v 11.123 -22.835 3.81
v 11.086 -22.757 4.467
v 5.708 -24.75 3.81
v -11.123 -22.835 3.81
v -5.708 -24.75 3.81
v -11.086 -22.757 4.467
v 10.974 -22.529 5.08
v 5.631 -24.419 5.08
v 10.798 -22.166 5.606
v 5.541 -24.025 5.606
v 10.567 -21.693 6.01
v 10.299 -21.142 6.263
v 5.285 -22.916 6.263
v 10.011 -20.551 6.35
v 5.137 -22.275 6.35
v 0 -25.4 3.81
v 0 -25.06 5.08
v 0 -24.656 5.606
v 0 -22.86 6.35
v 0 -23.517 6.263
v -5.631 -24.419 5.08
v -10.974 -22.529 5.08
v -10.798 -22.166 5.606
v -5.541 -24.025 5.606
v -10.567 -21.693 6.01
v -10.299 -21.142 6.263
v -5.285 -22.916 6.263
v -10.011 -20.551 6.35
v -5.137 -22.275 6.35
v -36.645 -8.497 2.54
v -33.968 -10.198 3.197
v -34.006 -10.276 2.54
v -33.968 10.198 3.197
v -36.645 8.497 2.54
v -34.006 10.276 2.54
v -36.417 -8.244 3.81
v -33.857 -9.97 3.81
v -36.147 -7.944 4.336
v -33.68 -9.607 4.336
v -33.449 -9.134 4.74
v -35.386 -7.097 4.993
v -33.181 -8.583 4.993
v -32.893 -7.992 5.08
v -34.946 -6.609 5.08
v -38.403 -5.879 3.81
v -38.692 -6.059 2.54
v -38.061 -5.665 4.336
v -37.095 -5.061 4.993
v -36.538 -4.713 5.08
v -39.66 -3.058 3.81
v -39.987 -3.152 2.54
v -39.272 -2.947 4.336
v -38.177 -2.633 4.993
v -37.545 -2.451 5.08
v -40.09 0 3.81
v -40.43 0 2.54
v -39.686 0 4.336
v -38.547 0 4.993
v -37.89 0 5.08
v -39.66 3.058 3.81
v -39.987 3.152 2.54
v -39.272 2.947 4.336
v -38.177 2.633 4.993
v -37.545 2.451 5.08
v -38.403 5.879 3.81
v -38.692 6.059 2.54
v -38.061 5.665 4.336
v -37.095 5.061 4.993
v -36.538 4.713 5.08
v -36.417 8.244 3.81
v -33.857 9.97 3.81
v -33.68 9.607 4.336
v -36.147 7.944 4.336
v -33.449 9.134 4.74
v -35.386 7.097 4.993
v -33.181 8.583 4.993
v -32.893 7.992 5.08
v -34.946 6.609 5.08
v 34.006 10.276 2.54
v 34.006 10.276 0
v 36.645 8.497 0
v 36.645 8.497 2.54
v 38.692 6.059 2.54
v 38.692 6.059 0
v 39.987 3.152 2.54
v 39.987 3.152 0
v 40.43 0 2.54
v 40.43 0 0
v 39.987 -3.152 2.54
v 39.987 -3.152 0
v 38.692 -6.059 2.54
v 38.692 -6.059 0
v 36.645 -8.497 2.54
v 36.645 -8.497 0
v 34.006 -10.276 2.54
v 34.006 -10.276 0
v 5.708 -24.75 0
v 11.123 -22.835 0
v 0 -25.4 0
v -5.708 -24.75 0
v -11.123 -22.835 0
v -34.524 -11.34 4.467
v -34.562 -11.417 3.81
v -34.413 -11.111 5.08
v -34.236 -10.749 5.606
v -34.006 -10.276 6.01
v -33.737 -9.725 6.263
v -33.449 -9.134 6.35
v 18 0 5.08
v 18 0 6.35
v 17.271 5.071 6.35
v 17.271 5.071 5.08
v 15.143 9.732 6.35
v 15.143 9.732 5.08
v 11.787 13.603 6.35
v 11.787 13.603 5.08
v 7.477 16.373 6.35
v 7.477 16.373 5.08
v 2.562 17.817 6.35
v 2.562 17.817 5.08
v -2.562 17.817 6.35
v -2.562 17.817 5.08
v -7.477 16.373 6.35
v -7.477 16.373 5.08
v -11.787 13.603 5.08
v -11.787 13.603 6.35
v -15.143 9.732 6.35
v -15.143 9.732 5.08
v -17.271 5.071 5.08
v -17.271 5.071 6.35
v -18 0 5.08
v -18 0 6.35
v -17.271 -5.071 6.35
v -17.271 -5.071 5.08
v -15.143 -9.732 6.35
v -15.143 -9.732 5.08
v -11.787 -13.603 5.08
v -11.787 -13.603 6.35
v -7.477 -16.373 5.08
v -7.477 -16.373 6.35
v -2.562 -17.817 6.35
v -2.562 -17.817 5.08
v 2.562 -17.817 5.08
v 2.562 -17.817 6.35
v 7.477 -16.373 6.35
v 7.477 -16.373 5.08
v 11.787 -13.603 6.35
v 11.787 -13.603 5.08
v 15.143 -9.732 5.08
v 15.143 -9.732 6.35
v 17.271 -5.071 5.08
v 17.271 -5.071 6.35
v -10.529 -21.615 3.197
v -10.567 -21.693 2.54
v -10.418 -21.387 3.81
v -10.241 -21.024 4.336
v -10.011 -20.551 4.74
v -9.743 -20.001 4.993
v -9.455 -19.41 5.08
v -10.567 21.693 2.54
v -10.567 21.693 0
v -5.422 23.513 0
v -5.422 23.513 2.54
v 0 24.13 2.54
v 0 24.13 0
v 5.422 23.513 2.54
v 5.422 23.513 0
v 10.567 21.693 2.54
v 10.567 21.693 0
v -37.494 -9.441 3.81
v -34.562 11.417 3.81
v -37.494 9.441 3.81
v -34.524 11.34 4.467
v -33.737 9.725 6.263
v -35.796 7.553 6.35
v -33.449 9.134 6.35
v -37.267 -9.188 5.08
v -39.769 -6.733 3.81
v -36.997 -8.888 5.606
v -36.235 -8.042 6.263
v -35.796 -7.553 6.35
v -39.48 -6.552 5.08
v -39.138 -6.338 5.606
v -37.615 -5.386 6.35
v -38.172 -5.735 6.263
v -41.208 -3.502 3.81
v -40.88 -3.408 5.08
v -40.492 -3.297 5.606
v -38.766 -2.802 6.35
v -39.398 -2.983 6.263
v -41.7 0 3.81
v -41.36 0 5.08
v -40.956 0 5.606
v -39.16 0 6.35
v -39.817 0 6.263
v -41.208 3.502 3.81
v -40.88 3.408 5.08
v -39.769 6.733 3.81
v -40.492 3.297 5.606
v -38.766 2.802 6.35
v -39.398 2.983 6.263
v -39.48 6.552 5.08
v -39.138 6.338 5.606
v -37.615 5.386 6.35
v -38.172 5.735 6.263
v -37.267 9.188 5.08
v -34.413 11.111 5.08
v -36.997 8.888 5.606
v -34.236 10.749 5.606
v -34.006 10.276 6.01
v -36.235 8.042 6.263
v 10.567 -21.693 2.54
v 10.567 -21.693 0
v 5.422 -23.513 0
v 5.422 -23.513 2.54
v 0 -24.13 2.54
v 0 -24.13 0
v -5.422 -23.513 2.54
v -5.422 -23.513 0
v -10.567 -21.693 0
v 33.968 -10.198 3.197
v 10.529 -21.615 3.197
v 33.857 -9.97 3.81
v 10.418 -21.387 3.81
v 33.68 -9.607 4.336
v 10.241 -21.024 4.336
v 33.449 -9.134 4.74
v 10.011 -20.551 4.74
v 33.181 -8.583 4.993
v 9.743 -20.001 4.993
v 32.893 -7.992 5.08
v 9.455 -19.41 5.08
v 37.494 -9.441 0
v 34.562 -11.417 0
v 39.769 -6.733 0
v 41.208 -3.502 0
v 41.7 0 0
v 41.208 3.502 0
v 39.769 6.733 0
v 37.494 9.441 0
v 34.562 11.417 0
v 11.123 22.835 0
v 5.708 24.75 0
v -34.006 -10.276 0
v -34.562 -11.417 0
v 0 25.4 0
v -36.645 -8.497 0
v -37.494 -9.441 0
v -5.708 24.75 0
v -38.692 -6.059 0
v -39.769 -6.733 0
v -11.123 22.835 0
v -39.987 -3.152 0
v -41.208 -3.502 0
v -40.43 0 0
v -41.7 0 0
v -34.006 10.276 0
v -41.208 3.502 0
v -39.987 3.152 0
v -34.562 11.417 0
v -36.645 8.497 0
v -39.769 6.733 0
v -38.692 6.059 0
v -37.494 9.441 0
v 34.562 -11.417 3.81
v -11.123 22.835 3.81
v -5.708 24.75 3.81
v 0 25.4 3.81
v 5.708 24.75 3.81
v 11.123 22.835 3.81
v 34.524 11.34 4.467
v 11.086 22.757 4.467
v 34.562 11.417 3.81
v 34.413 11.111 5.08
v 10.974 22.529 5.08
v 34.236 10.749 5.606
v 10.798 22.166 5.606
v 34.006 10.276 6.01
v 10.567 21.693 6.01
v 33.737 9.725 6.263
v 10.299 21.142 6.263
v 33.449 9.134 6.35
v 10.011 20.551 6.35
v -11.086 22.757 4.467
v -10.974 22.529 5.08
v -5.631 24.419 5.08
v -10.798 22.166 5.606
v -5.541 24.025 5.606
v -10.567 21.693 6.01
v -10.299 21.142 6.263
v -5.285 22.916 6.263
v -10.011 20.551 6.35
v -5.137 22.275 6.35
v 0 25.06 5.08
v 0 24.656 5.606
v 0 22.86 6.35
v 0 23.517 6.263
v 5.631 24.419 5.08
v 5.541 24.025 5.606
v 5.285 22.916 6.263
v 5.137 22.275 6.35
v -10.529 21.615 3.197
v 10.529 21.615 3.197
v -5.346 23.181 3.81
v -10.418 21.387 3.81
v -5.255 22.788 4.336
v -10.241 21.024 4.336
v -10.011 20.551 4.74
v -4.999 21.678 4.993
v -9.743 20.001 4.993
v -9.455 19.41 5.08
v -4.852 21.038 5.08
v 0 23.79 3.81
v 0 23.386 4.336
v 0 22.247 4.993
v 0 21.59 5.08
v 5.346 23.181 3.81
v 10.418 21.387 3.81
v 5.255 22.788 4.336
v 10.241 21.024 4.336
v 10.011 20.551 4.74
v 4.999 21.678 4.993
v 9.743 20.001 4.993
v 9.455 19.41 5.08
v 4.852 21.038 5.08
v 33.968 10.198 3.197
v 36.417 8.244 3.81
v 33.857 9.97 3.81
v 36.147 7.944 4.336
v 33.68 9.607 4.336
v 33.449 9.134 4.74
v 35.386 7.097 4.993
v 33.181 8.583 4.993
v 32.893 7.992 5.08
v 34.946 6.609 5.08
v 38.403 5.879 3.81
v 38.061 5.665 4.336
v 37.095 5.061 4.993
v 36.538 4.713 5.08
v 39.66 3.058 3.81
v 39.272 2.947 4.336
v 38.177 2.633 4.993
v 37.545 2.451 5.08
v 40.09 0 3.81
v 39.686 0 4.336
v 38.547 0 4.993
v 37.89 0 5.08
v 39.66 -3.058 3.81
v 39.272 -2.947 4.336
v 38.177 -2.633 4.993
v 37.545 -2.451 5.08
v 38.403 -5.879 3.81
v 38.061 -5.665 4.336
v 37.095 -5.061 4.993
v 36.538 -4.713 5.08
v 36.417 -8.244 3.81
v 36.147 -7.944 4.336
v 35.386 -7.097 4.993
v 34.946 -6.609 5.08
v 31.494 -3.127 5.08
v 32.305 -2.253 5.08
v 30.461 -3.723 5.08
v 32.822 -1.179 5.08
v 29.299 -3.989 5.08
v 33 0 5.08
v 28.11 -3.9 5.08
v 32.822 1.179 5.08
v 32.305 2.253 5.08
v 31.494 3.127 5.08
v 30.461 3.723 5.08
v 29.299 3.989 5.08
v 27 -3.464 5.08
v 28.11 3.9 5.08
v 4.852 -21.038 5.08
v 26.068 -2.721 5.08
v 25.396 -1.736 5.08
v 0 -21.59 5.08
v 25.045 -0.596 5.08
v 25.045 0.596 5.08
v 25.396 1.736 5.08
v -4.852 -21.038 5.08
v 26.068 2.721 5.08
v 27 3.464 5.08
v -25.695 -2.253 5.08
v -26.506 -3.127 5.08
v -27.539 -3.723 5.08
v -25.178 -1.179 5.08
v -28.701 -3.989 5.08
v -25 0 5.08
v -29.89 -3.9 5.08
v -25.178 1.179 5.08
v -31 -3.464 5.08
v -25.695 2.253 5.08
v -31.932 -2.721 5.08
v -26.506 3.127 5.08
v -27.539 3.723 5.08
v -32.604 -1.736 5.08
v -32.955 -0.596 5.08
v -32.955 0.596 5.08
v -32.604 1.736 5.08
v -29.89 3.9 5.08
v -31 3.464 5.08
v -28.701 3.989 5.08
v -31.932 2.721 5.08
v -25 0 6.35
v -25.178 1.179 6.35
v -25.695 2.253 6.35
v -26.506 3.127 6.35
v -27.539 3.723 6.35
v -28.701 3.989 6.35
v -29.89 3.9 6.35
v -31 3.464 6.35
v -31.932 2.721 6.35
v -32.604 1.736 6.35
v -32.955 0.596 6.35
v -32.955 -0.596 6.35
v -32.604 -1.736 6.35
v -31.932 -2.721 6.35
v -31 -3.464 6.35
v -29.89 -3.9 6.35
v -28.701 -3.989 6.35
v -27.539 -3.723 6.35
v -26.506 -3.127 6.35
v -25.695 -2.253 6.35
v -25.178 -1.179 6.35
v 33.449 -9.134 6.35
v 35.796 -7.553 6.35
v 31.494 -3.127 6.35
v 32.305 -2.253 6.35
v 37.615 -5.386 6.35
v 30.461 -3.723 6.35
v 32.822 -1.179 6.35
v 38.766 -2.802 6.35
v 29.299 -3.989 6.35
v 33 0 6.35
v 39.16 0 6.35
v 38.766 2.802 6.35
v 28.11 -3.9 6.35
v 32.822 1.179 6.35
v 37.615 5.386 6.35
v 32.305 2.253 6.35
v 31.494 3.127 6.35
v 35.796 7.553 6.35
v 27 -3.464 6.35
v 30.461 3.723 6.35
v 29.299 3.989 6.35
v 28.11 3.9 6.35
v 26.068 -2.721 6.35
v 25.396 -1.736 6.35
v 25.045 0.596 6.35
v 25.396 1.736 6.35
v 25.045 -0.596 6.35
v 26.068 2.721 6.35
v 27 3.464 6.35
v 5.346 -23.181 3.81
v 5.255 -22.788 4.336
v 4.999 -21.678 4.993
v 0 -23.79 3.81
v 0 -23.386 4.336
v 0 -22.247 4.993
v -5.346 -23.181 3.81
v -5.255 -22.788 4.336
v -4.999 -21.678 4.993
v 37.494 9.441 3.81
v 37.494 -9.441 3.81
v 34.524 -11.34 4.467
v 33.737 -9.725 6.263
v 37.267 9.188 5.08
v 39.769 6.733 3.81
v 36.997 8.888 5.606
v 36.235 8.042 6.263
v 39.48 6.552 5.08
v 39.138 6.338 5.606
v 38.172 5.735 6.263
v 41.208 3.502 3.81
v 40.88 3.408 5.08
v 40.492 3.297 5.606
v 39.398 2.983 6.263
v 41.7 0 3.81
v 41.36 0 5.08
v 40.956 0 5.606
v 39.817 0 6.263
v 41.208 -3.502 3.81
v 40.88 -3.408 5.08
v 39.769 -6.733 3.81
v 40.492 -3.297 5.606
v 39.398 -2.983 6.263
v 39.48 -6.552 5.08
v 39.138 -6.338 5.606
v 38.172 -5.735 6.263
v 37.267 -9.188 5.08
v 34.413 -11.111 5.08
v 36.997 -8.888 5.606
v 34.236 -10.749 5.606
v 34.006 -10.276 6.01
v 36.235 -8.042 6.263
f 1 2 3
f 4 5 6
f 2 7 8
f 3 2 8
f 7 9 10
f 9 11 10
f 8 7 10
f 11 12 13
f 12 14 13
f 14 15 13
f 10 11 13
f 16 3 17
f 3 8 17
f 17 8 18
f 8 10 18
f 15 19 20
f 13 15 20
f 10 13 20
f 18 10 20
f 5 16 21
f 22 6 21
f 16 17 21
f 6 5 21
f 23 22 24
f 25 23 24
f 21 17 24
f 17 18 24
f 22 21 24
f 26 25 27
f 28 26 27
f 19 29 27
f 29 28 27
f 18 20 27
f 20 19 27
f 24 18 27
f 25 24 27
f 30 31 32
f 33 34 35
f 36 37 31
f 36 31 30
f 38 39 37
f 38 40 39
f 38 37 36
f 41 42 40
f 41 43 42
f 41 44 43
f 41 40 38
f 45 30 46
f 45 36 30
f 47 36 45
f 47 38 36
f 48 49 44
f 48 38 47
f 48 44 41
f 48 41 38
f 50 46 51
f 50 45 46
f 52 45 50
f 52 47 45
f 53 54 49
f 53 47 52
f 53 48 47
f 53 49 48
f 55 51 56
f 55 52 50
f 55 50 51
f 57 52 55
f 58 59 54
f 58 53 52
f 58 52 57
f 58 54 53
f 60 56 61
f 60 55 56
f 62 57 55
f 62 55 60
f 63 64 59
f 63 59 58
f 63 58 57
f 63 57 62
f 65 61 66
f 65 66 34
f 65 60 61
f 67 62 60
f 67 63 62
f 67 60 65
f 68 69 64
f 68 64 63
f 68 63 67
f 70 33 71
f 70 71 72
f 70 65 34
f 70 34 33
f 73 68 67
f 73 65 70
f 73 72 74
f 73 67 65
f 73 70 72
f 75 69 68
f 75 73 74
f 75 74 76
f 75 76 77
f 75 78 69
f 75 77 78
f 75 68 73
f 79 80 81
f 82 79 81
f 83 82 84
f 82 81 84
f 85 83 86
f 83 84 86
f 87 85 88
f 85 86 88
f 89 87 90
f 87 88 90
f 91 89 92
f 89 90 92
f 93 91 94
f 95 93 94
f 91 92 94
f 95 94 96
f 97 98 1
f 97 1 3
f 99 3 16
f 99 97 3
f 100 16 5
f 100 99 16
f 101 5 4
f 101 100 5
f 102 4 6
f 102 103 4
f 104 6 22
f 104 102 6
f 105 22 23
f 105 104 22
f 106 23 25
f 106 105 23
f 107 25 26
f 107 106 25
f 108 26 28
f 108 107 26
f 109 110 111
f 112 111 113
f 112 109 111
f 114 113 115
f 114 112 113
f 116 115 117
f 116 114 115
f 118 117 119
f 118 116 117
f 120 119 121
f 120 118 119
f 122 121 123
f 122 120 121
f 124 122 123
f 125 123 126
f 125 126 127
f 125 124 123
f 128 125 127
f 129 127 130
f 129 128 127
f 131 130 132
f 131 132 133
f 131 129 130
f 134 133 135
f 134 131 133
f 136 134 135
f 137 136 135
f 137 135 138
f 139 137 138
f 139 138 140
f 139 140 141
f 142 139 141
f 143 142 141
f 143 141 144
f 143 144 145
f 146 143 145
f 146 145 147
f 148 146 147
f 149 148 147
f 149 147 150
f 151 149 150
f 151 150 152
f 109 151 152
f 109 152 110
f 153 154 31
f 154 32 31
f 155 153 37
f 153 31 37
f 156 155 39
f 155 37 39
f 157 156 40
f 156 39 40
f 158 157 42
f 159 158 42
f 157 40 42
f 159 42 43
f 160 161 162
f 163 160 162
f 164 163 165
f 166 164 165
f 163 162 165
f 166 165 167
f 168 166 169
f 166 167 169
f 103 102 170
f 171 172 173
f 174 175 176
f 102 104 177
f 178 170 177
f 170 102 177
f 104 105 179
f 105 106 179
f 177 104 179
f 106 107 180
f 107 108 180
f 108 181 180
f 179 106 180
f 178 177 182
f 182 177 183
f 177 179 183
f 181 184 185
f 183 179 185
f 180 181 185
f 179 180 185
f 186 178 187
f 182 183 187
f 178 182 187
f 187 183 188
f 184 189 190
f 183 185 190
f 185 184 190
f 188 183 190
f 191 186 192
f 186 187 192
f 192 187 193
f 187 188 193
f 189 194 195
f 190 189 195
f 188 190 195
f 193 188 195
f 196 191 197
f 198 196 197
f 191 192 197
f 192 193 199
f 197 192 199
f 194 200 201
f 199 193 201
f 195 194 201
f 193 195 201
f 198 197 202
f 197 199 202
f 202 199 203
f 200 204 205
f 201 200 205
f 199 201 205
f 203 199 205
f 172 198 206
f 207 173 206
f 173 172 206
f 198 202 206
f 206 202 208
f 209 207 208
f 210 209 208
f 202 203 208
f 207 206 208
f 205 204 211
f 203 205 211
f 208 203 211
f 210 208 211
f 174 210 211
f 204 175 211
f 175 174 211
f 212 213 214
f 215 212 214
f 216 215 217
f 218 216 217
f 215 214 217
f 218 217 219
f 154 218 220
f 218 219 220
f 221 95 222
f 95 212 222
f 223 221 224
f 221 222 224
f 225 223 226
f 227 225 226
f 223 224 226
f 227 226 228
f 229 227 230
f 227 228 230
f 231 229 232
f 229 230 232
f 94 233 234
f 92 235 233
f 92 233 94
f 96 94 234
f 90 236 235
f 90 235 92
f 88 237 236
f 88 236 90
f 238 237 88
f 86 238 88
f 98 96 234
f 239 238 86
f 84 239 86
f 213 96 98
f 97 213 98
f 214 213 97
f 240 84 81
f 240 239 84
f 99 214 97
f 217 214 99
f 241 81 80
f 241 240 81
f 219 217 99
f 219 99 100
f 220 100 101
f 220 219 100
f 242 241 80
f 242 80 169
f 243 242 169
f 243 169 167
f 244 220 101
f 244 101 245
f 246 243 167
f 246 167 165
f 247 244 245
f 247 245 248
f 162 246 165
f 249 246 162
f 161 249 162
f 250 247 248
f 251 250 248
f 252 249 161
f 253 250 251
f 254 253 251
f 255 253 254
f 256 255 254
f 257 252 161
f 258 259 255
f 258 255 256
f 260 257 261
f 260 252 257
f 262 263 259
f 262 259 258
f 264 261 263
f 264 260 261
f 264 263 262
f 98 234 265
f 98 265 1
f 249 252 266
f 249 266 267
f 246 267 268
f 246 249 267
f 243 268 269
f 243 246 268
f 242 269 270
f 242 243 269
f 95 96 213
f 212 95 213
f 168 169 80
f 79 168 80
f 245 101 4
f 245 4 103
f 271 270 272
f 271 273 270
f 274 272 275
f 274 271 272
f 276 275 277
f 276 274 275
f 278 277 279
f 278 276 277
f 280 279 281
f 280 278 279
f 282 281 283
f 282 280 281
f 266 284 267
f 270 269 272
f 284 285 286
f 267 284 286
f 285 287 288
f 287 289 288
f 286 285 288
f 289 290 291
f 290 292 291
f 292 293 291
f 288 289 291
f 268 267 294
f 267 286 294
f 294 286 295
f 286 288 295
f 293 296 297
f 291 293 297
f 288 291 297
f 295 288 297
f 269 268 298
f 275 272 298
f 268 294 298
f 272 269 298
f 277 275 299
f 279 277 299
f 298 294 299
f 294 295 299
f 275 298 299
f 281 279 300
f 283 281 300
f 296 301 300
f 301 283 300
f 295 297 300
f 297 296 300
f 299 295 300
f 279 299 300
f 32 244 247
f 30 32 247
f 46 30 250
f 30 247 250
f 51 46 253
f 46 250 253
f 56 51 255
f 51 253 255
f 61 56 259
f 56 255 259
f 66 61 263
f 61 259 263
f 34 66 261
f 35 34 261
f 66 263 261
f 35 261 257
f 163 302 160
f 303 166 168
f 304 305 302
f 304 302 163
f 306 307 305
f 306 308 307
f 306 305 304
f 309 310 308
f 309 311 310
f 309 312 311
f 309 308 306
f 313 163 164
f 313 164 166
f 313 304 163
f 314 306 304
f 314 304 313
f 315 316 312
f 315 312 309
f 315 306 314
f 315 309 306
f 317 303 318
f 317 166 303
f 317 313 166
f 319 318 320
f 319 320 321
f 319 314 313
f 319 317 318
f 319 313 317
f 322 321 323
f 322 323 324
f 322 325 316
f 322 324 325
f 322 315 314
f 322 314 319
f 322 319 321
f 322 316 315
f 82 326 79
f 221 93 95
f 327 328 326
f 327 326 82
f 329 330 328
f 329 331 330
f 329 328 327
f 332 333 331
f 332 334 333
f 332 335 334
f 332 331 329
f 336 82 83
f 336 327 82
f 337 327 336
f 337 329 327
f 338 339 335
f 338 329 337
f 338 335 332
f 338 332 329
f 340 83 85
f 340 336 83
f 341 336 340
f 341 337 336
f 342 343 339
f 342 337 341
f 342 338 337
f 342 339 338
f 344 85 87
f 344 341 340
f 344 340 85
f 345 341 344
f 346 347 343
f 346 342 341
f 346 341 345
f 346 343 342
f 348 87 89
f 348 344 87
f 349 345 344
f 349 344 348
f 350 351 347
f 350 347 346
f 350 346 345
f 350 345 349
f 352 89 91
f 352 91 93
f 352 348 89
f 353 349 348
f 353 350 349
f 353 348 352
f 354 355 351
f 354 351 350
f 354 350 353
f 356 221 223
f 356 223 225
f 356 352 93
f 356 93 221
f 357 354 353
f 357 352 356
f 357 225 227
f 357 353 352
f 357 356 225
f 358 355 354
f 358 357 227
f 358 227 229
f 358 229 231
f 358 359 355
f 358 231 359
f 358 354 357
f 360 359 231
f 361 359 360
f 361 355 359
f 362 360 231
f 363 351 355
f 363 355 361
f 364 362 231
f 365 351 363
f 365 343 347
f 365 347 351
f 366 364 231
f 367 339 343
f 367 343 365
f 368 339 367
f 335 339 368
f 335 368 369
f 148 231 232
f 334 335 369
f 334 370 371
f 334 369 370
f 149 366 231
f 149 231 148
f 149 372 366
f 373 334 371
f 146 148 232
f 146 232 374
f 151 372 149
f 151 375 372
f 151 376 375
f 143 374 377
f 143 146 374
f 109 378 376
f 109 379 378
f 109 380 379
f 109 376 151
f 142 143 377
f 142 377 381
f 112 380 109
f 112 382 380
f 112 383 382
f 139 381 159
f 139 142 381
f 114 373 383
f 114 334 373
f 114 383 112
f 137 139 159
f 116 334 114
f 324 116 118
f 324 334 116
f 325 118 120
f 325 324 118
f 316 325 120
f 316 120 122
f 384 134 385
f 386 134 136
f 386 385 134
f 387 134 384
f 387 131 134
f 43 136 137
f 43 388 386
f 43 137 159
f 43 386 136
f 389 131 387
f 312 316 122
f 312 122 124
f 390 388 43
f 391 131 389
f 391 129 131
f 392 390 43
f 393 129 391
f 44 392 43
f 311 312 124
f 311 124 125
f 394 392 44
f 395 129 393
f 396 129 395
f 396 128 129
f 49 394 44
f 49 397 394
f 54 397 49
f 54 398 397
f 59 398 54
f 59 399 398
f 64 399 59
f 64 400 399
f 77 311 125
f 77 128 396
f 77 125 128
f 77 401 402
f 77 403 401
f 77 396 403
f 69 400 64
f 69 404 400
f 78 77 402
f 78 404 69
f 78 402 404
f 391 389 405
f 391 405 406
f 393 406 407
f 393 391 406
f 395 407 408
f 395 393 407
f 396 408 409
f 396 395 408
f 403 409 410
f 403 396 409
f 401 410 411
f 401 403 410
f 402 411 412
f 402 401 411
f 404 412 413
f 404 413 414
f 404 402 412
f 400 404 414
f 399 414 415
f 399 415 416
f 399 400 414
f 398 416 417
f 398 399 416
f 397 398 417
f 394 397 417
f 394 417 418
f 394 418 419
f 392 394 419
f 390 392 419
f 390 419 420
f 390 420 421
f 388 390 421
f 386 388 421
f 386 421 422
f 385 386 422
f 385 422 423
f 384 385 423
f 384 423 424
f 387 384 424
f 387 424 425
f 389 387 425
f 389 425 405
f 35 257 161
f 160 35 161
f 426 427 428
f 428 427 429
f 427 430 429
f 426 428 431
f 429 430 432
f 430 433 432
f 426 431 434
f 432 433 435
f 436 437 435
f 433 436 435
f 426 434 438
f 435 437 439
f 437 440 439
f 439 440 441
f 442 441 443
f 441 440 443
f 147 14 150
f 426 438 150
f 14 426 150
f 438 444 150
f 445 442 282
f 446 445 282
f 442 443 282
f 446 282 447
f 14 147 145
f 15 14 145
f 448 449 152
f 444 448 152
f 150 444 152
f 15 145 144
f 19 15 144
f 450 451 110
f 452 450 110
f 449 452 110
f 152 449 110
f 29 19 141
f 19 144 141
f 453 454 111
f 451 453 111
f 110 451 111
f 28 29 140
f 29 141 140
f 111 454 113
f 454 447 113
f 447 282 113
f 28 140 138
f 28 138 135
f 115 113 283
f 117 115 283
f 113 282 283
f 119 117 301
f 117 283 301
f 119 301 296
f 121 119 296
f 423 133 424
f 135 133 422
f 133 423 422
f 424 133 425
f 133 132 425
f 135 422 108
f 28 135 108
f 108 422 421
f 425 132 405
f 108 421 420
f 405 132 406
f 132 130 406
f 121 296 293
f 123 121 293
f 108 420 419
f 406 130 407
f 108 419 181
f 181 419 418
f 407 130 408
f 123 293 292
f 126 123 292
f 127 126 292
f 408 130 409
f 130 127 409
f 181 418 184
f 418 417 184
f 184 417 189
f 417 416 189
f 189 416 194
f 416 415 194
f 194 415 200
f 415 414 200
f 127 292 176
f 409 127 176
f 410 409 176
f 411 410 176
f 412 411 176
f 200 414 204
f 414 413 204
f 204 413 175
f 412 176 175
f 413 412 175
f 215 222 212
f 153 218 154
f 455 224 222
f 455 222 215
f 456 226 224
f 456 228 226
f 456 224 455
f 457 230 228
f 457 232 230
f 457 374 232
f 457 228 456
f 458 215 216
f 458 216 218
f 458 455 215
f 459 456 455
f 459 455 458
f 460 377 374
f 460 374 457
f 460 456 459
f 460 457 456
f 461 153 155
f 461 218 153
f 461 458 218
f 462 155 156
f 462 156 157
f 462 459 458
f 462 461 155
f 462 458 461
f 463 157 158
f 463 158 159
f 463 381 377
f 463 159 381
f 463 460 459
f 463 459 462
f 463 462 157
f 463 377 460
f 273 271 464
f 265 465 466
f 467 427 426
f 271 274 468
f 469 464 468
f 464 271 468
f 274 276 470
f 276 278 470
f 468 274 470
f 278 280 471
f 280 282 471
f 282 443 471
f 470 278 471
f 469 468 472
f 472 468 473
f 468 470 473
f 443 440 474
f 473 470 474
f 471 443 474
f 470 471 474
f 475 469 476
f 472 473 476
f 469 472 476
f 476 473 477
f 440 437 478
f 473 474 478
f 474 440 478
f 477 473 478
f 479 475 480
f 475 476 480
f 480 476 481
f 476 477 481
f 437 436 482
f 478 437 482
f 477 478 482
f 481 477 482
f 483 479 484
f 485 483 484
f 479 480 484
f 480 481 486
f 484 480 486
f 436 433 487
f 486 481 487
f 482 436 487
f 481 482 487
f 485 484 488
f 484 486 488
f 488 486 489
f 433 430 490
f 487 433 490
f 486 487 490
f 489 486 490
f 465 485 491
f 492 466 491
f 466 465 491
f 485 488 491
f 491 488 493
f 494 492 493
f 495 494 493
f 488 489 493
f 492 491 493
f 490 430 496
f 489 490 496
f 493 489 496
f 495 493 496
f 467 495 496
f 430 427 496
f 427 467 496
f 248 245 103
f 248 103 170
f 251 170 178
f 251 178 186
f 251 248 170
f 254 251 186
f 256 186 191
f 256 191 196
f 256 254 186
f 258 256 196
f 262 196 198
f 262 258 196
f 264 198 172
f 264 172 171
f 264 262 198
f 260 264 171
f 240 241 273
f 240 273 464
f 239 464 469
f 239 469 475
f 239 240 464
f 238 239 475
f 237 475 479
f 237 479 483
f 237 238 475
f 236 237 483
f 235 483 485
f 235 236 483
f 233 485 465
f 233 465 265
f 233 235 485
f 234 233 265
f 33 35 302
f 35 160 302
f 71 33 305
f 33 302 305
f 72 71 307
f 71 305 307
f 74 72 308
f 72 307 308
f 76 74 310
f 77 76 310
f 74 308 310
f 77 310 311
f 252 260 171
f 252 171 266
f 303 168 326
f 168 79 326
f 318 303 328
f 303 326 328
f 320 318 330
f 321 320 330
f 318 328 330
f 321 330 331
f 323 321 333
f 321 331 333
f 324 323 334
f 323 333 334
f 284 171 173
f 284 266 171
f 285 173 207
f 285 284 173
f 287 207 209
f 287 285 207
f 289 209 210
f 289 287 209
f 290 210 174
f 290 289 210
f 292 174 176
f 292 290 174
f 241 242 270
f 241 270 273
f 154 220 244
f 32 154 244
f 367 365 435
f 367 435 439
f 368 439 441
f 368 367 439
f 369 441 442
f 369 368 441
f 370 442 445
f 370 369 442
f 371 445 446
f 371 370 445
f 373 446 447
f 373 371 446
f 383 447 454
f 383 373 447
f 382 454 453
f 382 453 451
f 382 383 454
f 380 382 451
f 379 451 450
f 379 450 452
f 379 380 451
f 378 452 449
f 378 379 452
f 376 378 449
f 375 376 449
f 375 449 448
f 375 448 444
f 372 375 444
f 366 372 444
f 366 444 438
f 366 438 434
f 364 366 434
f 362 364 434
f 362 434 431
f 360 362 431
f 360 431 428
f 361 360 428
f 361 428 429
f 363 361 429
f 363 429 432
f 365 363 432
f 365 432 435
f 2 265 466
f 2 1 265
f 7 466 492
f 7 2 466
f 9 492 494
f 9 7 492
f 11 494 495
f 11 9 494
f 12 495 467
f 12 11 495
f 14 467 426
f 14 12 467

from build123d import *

# Parameters (mm, degrees)
SKETCH1_R           = 4
SKETCH1_R_2         = 18
BOSS_EXTRUDE1_DEPTH = 6.35
CUT_EXTRUDE1_DEPTH  = 5.08
FILLET1_R           = 2.54


with BuildPart() as part:
    # Sketch1 → Boss-Extrude1 (new body)
    with BuildSketch(Plane.XY):
        with BuildLine():
            Line((-34.561724138, 11.41740884), (-11.123448276, 22.834817679))
            ThreePointArc((-11.123448276, 22.834817679), (0, 25.4), (11.123448276, 22.834817679))
            Line((11.123448276, 22.834817679), (34.561724138, 11.41740884))
            ThreePointArc((34.561724138, 11.41740884), (41.7, 0), (34.561724138, -11.41740884))
            Line((34.561724138, -11.41740884), (11.123448276, -22.834817679))
            ThreePointArc((11.123448276, -22.834817679), (0, -25.4), (-11.123448276, -22.834817679))
            Line((-11.123448276, -22.834817679), (-34.561724138, -11.41740884))
            ThreePointArc((-34.561724138, -11.41740884), (-41.7, 0), (-34.561724138, 11.41740884))
        make_face()
        with Locations((-29, 0)):
            Circle(SKETCH1_R, mode=Mode.SUBTRACT)
        with Locations((29, 0)):
            Circle(SKETCH1_R, mode=Mode.SUBTRACT)
        Circle(SKETCH1_R_2, mode=Mode.SUBTRACT)
    extrude(amount=BOSS_EXTRUDE1_DEPTH)

    # Sketch2 → Cut-Extrude1 (cut)
    with BuildSketch(Plane(origin=(0, 0, 0), x_dir=(-1, 0, 0), z_dir=(0, 0, -1))):
        with BuildLine():
            Line((34.005551724, 10.275667956), (10.567275862, 21.693076795))
            ThreePointArc((10.567275862, 21.693076795), (0, 24.13), (-10.567275862, 21.693076795))
            Line((-10.567275862, 21.693076795), (-34.005551724, 10.275667956))
            ThreePointArc((-34.005551724, 10.275667956), (-40.43, 0), (-34.005551724, -10.275667956))
            Line((-34.005551724, -10.275667956), (-10.567275862, -21.693076795))
            ThreePointArc((-10.567275862, -21.693076795), (0, -24.13), (10.567275862, -21.693076795))
            Line((10.567275862, -21.693076795), (34.005551724, -10.275667956))
            ThreePointArc((34.005551724, -10.275667956), (40.43, 0), (34.005551724, 10.275667956))
        make_face()
    extrude(amount=-CUT_EXTRUDE1_DEPTH, mode=Mode.SUBTRACT)

    # Fillet1
    fillet1_edges = [part.edges().sort_by_distance(p)[0] for p in [
        (-41.7, 0, 6.35),
        (-22.842586207, -17.12611326, 6.35),
        (0, -25.4, 6.35),
        (22.842586207, -17.12611326, 6.35),
        (41.7, 0, 6.35),
        (22.842586207, 17.12611326, 6.35),
        (0, 25.4, 6.35),
        (0, 24.13, 5.08),
        (-22.286413793, 15.984372376, 5.08),
        (-40.43, 0, 5.08),
        (-22.286413793, -15.984372376, 5.08),
        (0, -24.13, 5.08),
        (22.286413793, -15.984372376, 5.08),
        (40.43, 0, 5.08),
        (22.286413793, 15.984372376, 5.08),
        (-22.842586207, 17.12611326, 6.35),
    ]]
    fillet(fillet1_edges, radius=FILLET1_R)


solid = part.part
